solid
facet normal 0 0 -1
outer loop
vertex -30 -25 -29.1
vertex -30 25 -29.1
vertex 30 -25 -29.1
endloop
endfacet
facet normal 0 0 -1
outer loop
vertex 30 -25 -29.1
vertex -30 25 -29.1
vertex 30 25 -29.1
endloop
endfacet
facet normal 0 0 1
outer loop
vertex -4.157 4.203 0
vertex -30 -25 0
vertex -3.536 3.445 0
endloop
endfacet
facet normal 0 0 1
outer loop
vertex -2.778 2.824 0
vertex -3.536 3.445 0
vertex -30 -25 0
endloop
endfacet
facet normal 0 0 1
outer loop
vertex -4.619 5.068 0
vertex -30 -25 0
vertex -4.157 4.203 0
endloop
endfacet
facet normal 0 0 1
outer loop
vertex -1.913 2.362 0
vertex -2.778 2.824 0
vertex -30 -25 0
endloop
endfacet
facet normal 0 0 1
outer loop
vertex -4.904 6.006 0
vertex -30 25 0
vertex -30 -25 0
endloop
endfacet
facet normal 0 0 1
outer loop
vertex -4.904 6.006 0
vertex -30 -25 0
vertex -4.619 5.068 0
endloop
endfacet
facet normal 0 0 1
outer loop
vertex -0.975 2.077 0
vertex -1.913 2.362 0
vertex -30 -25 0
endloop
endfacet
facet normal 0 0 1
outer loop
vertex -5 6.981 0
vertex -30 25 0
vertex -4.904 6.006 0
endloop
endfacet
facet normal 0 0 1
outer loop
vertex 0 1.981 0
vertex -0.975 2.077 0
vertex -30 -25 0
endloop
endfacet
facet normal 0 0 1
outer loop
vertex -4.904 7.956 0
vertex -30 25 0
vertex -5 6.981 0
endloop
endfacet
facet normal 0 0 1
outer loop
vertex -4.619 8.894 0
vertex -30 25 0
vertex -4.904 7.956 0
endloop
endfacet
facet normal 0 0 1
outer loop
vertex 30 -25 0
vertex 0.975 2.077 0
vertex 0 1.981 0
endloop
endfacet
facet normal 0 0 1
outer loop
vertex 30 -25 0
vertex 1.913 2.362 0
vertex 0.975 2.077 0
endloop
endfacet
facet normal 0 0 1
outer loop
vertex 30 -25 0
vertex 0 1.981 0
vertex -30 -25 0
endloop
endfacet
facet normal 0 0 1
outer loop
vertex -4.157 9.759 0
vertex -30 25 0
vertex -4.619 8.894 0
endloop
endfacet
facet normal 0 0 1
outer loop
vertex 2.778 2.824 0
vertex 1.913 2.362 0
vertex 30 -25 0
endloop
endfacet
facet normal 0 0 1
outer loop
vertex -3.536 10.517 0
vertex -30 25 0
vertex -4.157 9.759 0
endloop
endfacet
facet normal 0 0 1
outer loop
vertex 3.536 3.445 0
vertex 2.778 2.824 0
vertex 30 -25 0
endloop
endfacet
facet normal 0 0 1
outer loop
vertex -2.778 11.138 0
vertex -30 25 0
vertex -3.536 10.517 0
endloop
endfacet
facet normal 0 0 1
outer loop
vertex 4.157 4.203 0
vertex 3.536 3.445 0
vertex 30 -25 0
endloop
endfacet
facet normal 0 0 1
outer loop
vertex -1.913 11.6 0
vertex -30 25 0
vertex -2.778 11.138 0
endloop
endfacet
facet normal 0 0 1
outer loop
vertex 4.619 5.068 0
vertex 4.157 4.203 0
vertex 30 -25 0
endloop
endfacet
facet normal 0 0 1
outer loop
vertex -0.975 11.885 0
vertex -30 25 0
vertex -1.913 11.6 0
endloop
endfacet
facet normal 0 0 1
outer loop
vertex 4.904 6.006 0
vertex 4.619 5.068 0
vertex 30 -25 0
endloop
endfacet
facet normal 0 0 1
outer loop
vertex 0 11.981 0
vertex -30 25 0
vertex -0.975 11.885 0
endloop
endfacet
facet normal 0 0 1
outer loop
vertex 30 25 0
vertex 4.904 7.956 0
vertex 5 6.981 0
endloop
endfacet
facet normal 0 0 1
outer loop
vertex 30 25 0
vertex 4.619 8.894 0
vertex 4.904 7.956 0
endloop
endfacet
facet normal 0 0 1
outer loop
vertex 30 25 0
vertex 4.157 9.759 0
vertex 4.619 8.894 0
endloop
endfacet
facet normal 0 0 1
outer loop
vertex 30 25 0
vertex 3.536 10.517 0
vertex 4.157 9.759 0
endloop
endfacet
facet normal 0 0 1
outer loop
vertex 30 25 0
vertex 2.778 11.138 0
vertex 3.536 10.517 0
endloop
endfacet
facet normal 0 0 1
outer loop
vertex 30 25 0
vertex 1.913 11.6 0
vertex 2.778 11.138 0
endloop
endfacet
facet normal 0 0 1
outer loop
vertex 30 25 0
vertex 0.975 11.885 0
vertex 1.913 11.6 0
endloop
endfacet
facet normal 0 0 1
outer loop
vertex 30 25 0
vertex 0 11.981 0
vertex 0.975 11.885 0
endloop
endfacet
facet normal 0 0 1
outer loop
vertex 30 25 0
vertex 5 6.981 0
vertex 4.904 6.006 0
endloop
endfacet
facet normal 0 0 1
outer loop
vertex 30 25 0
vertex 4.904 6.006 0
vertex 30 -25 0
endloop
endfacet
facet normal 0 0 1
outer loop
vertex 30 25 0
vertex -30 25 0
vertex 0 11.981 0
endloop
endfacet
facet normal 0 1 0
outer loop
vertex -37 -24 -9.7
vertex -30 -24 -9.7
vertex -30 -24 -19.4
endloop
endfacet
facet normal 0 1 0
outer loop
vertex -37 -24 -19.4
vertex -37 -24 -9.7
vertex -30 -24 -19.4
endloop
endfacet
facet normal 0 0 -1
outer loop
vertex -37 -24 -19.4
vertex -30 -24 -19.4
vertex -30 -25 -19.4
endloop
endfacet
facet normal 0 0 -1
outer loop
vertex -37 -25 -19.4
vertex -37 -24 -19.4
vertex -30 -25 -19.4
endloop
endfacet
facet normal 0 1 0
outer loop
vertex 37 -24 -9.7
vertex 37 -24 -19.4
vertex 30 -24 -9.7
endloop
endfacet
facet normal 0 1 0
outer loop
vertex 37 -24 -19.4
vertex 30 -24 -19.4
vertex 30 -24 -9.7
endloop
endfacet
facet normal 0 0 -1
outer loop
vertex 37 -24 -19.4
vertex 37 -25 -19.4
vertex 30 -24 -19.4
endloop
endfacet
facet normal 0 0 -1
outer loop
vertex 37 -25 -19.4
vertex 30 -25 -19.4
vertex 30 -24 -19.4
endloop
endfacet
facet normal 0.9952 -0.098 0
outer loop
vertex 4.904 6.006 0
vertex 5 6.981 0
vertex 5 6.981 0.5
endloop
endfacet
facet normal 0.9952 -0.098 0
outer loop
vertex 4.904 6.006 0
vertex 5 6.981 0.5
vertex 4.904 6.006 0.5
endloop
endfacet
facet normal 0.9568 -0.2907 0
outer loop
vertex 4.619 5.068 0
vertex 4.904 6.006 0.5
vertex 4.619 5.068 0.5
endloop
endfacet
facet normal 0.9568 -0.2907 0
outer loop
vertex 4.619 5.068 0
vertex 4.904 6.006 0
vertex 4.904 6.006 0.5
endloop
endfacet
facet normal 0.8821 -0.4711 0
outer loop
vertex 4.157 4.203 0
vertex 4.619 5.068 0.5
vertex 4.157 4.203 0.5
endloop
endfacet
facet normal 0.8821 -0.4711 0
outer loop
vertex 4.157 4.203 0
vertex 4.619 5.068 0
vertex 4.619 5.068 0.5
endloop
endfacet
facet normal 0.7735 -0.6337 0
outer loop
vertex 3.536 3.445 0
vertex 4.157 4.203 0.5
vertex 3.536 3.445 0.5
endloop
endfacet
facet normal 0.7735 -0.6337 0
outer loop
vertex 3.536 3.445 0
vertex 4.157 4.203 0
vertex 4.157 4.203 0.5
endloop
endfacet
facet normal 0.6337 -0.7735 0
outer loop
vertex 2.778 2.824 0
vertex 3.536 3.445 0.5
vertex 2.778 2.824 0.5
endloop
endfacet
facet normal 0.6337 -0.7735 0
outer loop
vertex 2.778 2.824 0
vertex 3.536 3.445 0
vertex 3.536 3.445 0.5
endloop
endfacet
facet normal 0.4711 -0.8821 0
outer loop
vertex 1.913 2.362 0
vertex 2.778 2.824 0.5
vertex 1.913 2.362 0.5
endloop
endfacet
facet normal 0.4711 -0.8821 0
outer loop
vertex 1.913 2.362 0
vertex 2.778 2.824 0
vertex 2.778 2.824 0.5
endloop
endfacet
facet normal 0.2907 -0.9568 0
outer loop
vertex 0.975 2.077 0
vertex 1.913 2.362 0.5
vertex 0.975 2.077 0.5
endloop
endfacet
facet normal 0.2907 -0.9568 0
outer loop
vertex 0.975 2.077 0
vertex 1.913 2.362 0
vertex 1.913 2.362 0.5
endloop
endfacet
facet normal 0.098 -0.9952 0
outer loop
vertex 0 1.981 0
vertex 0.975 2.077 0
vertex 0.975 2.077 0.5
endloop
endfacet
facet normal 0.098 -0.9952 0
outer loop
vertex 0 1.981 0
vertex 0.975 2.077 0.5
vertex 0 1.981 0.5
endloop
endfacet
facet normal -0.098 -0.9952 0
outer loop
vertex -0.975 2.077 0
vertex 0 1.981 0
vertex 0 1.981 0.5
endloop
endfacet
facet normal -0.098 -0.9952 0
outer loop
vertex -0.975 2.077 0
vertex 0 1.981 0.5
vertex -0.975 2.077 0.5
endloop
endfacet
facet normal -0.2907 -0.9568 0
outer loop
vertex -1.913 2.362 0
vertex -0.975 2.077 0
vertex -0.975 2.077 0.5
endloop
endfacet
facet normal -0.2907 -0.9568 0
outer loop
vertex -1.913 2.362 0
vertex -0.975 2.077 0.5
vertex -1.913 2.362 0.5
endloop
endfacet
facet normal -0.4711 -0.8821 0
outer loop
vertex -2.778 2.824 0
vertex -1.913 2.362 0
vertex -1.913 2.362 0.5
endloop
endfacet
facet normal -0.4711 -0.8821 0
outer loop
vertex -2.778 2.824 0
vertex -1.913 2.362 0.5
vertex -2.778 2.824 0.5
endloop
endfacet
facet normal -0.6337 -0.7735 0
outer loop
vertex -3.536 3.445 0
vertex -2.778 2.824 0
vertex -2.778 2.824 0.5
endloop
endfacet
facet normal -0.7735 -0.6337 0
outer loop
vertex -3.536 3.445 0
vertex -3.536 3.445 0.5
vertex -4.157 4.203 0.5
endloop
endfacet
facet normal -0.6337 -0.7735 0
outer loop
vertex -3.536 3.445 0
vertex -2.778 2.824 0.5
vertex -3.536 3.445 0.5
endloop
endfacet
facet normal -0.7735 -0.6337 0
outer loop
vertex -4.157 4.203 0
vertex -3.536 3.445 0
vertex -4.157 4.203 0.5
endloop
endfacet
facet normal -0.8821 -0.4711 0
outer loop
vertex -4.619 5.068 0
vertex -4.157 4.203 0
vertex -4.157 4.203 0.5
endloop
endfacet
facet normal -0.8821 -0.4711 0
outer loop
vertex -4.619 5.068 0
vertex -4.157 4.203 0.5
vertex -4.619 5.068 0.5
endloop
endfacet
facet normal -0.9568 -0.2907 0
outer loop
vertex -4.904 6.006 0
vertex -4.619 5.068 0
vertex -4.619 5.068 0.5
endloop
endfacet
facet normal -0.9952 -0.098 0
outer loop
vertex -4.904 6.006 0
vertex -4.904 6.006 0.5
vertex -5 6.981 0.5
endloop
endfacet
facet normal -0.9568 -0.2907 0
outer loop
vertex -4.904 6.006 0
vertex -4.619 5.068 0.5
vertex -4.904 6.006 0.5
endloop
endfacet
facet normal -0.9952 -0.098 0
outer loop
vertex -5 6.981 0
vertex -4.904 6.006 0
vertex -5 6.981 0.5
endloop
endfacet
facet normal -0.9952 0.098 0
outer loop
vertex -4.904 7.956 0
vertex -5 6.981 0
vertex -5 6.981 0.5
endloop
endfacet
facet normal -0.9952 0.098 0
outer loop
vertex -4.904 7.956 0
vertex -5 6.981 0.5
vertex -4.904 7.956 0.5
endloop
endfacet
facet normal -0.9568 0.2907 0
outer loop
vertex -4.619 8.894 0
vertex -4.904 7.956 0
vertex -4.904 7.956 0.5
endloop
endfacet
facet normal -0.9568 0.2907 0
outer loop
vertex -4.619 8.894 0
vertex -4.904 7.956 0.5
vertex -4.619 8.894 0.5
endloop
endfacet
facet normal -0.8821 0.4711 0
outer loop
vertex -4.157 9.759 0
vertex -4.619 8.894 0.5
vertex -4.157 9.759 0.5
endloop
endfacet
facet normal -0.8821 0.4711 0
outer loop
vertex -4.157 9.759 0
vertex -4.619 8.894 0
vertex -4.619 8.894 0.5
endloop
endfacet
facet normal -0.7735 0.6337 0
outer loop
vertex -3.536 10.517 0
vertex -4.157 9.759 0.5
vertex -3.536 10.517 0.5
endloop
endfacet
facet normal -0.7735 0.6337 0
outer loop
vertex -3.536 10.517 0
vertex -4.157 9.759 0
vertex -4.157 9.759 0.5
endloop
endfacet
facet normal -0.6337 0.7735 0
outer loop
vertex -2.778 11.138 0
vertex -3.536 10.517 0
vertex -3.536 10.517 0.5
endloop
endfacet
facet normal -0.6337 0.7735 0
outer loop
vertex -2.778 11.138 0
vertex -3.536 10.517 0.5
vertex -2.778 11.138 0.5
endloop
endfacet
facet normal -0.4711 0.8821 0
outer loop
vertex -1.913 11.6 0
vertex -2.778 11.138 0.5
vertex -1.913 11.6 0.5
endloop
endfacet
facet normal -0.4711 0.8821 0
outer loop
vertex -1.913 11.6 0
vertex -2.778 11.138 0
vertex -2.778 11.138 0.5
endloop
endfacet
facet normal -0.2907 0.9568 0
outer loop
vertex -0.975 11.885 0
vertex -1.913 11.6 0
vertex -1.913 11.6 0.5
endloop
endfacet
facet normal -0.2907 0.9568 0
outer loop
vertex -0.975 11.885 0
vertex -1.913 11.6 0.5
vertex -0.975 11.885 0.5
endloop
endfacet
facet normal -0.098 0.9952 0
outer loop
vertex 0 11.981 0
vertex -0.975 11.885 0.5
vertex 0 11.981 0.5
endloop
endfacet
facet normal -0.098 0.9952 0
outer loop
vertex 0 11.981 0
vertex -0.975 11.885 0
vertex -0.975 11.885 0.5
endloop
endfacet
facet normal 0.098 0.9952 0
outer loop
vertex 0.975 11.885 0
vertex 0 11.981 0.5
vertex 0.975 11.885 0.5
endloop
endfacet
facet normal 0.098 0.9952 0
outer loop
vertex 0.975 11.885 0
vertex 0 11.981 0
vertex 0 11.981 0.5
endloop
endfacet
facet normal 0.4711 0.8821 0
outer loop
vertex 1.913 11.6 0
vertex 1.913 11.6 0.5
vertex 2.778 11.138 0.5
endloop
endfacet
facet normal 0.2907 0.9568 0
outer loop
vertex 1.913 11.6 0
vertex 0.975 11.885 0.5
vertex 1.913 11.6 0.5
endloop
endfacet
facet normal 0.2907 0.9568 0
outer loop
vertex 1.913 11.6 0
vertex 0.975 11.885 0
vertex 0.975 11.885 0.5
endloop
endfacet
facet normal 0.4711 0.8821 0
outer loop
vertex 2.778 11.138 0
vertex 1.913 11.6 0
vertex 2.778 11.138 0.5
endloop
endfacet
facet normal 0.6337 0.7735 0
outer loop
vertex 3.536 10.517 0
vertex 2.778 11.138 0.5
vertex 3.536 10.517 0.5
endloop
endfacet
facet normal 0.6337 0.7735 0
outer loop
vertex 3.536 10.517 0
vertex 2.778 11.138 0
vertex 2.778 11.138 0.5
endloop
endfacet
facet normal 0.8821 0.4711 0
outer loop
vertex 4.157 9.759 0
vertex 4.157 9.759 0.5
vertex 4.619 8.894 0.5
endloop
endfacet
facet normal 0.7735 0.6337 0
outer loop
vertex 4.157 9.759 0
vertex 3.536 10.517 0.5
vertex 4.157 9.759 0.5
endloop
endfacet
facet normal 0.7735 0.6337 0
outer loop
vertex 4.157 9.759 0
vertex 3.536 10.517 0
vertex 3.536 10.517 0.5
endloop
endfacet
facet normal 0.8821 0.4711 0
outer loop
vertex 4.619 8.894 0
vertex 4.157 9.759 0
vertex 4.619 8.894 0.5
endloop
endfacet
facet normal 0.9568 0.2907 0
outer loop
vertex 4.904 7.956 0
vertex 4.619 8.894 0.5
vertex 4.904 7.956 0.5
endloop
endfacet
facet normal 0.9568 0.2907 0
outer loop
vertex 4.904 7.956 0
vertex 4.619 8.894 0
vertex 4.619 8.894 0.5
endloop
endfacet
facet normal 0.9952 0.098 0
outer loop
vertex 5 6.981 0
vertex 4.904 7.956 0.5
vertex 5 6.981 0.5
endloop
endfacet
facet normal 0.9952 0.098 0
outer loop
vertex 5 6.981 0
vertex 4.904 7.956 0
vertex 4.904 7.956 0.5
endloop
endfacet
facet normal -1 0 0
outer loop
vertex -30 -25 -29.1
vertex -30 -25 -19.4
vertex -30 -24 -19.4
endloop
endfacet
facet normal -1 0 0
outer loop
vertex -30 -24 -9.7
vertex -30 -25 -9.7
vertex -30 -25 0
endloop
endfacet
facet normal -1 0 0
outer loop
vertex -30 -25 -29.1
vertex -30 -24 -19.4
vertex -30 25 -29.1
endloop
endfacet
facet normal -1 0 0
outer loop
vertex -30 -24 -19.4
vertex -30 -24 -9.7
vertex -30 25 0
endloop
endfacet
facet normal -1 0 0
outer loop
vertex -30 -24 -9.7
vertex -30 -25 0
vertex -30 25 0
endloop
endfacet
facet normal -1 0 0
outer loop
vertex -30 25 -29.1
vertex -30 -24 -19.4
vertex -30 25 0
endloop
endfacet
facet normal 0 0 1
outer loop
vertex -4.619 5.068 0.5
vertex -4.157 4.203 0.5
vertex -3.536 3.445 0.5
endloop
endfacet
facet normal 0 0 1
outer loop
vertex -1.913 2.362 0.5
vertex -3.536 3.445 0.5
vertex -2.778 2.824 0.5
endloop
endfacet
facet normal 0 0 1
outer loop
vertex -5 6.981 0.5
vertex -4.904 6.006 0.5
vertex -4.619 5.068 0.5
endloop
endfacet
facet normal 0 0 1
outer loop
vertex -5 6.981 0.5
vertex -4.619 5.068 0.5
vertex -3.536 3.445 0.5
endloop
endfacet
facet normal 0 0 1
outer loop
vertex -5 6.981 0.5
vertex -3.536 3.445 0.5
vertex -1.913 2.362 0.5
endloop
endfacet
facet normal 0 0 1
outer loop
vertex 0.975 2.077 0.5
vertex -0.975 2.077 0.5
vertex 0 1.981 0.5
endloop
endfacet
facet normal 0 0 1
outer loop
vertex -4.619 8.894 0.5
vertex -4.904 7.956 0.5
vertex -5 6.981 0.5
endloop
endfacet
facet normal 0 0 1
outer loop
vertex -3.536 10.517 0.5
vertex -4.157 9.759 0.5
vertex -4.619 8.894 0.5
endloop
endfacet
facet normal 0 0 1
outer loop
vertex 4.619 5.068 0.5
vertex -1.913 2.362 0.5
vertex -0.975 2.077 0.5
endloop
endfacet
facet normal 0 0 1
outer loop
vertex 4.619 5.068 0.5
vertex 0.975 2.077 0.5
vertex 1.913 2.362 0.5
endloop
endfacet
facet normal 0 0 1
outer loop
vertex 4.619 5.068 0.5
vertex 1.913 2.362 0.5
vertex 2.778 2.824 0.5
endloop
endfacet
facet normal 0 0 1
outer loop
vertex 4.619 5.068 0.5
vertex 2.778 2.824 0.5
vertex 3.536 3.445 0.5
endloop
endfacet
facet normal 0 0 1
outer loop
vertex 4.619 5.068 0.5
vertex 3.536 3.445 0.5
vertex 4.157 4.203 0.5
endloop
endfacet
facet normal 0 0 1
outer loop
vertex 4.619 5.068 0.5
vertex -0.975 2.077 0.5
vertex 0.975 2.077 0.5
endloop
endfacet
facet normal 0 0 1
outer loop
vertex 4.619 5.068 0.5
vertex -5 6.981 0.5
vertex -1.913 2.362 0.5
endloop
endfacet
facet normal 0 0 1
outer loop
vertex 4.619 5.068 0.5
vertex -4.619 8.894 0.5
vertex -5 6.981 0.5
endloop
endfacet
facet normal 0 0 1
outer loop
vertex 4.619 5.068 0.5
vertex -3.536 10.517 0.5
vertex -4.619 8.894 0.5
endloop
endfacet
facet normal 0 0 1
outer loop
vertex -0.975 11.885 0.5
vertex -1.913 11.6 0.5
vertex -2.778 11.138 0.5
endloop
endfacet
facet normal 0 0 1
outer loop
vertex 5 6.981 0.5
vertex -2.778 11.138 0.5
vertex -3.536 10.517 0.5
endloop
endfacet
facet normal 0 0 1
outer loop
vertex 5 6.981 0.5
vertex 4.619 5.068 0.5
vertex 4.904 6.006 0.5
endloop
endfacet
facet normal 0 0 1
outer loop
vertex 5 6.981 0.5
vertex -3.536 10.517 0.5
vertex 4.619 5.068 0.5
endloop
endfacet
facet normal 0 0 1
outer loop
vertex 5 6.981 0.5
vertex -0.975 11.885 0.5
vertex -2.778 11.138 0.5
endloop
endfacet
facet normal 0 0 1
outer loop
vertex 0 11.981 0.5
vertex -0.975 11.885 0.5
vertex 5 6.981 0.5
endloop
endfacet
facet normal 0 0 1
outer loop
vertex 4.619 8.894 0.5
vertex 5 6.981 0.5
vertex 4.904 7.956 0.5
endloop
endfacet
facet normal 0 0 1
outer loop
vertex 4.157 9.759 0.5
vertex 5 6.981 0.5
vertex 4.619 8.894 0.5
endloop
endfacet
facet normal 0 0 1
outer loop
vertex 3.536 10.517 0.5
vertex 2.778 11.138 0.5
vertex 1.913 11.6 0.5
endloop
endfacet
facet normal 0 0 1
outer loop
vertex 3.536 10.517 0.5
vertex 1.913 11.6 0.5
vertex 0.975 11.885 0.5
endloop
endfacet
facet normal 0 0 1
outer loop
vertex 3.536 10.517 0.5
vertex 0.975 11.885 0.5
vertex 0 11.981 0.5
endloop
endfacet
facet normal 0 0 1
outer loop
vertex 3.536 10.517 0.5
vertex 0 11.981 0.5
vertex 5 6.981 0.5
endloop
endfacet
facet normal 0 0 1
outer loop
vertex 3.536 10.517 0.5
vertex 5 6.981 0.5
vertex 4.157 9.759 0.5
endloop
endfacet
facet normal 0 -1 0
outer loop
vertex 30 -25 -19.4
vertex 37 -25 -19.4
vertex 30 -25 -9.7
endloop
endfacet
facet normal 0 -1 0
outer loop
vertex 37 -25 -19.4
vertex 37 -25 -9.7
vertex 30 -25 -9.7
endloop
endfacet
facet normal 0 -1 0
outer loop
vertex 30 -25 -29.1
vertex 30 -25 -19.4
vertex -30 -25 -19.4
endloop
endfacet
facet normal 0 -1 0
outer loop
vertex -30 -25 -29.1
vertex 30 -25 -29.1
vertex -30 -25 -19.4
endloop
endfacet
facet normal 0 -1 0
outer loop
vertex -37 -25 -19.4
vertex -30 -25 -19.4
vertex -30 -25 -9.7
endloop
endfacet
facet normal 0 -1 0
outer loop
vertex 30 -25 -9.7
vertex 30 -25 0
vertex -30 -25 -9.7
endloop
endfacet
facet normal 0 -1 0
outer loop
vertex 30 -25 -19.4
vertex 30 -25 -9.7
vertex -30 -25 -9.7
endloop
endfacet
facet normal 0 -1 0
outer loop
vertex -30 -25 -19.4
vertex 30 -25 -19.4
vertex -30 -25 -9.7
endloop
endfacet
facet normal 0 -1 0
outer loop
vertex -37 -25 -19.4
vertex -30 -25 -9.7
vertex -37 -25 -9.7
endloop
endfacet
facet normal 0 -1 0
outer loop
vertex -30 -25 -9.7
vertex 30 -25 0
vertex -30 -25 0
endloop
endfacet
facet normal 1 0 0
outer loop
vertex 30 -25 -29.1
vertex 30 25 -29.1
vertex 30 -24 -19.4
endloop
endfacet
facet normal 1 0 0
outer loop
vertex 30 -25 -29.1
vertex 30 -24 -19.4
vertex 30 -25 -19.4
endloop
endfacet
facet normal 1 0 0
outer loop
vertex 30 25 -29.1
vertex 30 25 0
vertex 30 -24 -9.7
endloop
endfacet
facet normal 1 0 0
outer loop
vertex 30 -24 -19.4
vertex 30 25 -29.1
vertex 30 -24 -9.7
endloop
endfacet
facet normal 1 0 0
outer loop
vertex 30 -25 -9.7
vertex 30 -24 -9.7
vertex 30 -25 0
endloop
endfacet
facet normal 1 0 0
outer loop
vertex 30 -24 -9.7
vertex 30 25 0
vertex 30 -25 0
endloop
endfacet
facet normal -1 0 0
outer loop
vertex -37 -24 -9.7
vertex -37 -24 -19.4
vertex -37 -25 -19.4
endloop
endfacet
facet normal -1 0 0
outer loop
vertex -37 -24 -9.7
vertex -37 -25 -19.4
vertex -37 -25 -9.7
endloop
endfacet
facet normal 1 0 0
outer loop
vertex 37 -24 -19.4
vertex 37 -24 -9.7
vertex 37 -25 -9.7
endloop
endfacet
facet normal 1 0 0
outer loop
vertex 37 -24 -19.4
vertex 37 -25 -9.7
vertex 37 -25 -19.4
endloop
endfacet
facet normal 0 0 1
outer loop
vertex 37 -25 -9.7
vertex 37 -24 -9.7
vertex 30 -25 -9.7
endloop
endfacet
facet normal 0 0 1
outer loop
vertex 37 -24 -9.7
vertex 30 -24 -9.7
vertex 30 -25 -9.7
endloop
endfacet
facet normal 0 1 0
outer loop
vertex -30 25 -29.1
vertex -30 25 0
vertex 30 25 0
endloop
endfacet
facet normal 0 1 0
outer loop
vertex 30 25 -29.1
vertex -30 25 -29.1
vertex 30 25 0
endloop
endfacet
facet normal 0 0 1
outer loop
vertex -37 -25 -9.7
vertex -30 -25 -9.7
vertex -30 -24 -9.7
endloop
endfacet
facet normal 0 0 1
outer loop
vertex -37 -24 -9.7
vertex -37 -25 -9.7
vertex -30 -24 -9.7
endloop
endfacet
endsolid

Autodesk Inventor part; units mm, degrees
ref_plane "YZ Plane" through (0, 0, 0) normal (1, 0, 0) x (0, 1, 0)
ref_plane "XZ Plane" through (0, 0, 0) normal (0, 1, 0) x (-1, 0, 0)
ref_plane "XY Plane" through (0, 0, 0) normal (0, 0, 1) x (1, 0, 0)
sketch "Skizze1" plane through (0, 0, 0) normal (0, 0, 1) x (1, 0, 0)
  line L0 (30, -25) -> (-30, -25)
  line L1 (-30, -25) -> (-30, 25)
  line L2 (-30, 25) -> (30, 25)
  line L3 (30, 25) -> (30, -25)
  point P0 (0, 0)
  point P1 (-30, 0)
  point P2 (0, 25)
  dimension "d0" = 50
  dimension "d1" = 60
extrude "Extrusion1" add sketch "Skizze1" against normal blind 29.1
sketch "Skizze2" plane through (0, 0, 0) normal (0, 0, 1) x (1, 0, 0)
  line L0 (-30, -25) -> (30, -25) projected
  circle A0 centre (0, 6.981) radius 5
  point P0 (0, 0)
  dimension "d4" = 31.981
  dimension "d5" = 10
sketch "Skizze4" plane through (30, -25, 0) normal (1, 0, 0) x (0, 0, -1)
  line L0 (0, 0) -> (0, 50) projected
  line L1 (0, 0) -> (29.1, 0) projected
  line L2 (29.1, 0) -> (19.4, 0)
  line L3 (9.7, 0) -> (19.4, 0)
  line L4 (19.4, 0) -> (19.4, 1)
  line L5 (19.4, 1) -> (9.7, 1)
  line L6 (9.7, 1) -> (9.7, 0)
  point P0 (0, 25)
extrude "Extrusion3" add sketch "Skizze4" along normal blind 7
mirror "Spiegeln1" about plane through (0, 0, 0) normal (1, 0, 0) of "Extrusion3"
sketch "Skizze5" plane through (30, -24, -9.7) normal (0, 1, 0) x (1, 0, 0)
  line L0 (7, 0) -> (7, 9.7) projected
  line L1 (0, -9.7) -> (0, 19.4) projected
  line L2 (0, -9.7) -> (0, 0) projected
  line L3 (-60, 9.7) -> (-60, 0) projected
  line L4 (-60, 9.7) -> (-67, 9.7) projected
  line L5 (-67, 9.7) -> (-67, 0) projected
  point P0 (-30, -9.7)
  point P1 (3.5, 4.7412)
  point P2 (-63.5, 4.85)
sketch "Skizze6" plane through (-30, 25, 0) normal (0, 1, 0) x (1, 0, 0)
  line L0 (17.0015, 26.6738) -> (64.1972, 26.6738) construction
  line L1 (64.1972, 26.6738) -> (64.1972, 22.3208) construction
  line L2 (64.1972, 22.3208) -> (17.0015, 22.3208) construction
  line L3 (17.0015, 22.3208) -> (17.0015, 26.6738) construction
  point P0 (30, 0)
extrude "Extrusion4" add sketch "Skizze2" along normal blind 0.5
properties part number "Lenkmotor1" material "Gold"
